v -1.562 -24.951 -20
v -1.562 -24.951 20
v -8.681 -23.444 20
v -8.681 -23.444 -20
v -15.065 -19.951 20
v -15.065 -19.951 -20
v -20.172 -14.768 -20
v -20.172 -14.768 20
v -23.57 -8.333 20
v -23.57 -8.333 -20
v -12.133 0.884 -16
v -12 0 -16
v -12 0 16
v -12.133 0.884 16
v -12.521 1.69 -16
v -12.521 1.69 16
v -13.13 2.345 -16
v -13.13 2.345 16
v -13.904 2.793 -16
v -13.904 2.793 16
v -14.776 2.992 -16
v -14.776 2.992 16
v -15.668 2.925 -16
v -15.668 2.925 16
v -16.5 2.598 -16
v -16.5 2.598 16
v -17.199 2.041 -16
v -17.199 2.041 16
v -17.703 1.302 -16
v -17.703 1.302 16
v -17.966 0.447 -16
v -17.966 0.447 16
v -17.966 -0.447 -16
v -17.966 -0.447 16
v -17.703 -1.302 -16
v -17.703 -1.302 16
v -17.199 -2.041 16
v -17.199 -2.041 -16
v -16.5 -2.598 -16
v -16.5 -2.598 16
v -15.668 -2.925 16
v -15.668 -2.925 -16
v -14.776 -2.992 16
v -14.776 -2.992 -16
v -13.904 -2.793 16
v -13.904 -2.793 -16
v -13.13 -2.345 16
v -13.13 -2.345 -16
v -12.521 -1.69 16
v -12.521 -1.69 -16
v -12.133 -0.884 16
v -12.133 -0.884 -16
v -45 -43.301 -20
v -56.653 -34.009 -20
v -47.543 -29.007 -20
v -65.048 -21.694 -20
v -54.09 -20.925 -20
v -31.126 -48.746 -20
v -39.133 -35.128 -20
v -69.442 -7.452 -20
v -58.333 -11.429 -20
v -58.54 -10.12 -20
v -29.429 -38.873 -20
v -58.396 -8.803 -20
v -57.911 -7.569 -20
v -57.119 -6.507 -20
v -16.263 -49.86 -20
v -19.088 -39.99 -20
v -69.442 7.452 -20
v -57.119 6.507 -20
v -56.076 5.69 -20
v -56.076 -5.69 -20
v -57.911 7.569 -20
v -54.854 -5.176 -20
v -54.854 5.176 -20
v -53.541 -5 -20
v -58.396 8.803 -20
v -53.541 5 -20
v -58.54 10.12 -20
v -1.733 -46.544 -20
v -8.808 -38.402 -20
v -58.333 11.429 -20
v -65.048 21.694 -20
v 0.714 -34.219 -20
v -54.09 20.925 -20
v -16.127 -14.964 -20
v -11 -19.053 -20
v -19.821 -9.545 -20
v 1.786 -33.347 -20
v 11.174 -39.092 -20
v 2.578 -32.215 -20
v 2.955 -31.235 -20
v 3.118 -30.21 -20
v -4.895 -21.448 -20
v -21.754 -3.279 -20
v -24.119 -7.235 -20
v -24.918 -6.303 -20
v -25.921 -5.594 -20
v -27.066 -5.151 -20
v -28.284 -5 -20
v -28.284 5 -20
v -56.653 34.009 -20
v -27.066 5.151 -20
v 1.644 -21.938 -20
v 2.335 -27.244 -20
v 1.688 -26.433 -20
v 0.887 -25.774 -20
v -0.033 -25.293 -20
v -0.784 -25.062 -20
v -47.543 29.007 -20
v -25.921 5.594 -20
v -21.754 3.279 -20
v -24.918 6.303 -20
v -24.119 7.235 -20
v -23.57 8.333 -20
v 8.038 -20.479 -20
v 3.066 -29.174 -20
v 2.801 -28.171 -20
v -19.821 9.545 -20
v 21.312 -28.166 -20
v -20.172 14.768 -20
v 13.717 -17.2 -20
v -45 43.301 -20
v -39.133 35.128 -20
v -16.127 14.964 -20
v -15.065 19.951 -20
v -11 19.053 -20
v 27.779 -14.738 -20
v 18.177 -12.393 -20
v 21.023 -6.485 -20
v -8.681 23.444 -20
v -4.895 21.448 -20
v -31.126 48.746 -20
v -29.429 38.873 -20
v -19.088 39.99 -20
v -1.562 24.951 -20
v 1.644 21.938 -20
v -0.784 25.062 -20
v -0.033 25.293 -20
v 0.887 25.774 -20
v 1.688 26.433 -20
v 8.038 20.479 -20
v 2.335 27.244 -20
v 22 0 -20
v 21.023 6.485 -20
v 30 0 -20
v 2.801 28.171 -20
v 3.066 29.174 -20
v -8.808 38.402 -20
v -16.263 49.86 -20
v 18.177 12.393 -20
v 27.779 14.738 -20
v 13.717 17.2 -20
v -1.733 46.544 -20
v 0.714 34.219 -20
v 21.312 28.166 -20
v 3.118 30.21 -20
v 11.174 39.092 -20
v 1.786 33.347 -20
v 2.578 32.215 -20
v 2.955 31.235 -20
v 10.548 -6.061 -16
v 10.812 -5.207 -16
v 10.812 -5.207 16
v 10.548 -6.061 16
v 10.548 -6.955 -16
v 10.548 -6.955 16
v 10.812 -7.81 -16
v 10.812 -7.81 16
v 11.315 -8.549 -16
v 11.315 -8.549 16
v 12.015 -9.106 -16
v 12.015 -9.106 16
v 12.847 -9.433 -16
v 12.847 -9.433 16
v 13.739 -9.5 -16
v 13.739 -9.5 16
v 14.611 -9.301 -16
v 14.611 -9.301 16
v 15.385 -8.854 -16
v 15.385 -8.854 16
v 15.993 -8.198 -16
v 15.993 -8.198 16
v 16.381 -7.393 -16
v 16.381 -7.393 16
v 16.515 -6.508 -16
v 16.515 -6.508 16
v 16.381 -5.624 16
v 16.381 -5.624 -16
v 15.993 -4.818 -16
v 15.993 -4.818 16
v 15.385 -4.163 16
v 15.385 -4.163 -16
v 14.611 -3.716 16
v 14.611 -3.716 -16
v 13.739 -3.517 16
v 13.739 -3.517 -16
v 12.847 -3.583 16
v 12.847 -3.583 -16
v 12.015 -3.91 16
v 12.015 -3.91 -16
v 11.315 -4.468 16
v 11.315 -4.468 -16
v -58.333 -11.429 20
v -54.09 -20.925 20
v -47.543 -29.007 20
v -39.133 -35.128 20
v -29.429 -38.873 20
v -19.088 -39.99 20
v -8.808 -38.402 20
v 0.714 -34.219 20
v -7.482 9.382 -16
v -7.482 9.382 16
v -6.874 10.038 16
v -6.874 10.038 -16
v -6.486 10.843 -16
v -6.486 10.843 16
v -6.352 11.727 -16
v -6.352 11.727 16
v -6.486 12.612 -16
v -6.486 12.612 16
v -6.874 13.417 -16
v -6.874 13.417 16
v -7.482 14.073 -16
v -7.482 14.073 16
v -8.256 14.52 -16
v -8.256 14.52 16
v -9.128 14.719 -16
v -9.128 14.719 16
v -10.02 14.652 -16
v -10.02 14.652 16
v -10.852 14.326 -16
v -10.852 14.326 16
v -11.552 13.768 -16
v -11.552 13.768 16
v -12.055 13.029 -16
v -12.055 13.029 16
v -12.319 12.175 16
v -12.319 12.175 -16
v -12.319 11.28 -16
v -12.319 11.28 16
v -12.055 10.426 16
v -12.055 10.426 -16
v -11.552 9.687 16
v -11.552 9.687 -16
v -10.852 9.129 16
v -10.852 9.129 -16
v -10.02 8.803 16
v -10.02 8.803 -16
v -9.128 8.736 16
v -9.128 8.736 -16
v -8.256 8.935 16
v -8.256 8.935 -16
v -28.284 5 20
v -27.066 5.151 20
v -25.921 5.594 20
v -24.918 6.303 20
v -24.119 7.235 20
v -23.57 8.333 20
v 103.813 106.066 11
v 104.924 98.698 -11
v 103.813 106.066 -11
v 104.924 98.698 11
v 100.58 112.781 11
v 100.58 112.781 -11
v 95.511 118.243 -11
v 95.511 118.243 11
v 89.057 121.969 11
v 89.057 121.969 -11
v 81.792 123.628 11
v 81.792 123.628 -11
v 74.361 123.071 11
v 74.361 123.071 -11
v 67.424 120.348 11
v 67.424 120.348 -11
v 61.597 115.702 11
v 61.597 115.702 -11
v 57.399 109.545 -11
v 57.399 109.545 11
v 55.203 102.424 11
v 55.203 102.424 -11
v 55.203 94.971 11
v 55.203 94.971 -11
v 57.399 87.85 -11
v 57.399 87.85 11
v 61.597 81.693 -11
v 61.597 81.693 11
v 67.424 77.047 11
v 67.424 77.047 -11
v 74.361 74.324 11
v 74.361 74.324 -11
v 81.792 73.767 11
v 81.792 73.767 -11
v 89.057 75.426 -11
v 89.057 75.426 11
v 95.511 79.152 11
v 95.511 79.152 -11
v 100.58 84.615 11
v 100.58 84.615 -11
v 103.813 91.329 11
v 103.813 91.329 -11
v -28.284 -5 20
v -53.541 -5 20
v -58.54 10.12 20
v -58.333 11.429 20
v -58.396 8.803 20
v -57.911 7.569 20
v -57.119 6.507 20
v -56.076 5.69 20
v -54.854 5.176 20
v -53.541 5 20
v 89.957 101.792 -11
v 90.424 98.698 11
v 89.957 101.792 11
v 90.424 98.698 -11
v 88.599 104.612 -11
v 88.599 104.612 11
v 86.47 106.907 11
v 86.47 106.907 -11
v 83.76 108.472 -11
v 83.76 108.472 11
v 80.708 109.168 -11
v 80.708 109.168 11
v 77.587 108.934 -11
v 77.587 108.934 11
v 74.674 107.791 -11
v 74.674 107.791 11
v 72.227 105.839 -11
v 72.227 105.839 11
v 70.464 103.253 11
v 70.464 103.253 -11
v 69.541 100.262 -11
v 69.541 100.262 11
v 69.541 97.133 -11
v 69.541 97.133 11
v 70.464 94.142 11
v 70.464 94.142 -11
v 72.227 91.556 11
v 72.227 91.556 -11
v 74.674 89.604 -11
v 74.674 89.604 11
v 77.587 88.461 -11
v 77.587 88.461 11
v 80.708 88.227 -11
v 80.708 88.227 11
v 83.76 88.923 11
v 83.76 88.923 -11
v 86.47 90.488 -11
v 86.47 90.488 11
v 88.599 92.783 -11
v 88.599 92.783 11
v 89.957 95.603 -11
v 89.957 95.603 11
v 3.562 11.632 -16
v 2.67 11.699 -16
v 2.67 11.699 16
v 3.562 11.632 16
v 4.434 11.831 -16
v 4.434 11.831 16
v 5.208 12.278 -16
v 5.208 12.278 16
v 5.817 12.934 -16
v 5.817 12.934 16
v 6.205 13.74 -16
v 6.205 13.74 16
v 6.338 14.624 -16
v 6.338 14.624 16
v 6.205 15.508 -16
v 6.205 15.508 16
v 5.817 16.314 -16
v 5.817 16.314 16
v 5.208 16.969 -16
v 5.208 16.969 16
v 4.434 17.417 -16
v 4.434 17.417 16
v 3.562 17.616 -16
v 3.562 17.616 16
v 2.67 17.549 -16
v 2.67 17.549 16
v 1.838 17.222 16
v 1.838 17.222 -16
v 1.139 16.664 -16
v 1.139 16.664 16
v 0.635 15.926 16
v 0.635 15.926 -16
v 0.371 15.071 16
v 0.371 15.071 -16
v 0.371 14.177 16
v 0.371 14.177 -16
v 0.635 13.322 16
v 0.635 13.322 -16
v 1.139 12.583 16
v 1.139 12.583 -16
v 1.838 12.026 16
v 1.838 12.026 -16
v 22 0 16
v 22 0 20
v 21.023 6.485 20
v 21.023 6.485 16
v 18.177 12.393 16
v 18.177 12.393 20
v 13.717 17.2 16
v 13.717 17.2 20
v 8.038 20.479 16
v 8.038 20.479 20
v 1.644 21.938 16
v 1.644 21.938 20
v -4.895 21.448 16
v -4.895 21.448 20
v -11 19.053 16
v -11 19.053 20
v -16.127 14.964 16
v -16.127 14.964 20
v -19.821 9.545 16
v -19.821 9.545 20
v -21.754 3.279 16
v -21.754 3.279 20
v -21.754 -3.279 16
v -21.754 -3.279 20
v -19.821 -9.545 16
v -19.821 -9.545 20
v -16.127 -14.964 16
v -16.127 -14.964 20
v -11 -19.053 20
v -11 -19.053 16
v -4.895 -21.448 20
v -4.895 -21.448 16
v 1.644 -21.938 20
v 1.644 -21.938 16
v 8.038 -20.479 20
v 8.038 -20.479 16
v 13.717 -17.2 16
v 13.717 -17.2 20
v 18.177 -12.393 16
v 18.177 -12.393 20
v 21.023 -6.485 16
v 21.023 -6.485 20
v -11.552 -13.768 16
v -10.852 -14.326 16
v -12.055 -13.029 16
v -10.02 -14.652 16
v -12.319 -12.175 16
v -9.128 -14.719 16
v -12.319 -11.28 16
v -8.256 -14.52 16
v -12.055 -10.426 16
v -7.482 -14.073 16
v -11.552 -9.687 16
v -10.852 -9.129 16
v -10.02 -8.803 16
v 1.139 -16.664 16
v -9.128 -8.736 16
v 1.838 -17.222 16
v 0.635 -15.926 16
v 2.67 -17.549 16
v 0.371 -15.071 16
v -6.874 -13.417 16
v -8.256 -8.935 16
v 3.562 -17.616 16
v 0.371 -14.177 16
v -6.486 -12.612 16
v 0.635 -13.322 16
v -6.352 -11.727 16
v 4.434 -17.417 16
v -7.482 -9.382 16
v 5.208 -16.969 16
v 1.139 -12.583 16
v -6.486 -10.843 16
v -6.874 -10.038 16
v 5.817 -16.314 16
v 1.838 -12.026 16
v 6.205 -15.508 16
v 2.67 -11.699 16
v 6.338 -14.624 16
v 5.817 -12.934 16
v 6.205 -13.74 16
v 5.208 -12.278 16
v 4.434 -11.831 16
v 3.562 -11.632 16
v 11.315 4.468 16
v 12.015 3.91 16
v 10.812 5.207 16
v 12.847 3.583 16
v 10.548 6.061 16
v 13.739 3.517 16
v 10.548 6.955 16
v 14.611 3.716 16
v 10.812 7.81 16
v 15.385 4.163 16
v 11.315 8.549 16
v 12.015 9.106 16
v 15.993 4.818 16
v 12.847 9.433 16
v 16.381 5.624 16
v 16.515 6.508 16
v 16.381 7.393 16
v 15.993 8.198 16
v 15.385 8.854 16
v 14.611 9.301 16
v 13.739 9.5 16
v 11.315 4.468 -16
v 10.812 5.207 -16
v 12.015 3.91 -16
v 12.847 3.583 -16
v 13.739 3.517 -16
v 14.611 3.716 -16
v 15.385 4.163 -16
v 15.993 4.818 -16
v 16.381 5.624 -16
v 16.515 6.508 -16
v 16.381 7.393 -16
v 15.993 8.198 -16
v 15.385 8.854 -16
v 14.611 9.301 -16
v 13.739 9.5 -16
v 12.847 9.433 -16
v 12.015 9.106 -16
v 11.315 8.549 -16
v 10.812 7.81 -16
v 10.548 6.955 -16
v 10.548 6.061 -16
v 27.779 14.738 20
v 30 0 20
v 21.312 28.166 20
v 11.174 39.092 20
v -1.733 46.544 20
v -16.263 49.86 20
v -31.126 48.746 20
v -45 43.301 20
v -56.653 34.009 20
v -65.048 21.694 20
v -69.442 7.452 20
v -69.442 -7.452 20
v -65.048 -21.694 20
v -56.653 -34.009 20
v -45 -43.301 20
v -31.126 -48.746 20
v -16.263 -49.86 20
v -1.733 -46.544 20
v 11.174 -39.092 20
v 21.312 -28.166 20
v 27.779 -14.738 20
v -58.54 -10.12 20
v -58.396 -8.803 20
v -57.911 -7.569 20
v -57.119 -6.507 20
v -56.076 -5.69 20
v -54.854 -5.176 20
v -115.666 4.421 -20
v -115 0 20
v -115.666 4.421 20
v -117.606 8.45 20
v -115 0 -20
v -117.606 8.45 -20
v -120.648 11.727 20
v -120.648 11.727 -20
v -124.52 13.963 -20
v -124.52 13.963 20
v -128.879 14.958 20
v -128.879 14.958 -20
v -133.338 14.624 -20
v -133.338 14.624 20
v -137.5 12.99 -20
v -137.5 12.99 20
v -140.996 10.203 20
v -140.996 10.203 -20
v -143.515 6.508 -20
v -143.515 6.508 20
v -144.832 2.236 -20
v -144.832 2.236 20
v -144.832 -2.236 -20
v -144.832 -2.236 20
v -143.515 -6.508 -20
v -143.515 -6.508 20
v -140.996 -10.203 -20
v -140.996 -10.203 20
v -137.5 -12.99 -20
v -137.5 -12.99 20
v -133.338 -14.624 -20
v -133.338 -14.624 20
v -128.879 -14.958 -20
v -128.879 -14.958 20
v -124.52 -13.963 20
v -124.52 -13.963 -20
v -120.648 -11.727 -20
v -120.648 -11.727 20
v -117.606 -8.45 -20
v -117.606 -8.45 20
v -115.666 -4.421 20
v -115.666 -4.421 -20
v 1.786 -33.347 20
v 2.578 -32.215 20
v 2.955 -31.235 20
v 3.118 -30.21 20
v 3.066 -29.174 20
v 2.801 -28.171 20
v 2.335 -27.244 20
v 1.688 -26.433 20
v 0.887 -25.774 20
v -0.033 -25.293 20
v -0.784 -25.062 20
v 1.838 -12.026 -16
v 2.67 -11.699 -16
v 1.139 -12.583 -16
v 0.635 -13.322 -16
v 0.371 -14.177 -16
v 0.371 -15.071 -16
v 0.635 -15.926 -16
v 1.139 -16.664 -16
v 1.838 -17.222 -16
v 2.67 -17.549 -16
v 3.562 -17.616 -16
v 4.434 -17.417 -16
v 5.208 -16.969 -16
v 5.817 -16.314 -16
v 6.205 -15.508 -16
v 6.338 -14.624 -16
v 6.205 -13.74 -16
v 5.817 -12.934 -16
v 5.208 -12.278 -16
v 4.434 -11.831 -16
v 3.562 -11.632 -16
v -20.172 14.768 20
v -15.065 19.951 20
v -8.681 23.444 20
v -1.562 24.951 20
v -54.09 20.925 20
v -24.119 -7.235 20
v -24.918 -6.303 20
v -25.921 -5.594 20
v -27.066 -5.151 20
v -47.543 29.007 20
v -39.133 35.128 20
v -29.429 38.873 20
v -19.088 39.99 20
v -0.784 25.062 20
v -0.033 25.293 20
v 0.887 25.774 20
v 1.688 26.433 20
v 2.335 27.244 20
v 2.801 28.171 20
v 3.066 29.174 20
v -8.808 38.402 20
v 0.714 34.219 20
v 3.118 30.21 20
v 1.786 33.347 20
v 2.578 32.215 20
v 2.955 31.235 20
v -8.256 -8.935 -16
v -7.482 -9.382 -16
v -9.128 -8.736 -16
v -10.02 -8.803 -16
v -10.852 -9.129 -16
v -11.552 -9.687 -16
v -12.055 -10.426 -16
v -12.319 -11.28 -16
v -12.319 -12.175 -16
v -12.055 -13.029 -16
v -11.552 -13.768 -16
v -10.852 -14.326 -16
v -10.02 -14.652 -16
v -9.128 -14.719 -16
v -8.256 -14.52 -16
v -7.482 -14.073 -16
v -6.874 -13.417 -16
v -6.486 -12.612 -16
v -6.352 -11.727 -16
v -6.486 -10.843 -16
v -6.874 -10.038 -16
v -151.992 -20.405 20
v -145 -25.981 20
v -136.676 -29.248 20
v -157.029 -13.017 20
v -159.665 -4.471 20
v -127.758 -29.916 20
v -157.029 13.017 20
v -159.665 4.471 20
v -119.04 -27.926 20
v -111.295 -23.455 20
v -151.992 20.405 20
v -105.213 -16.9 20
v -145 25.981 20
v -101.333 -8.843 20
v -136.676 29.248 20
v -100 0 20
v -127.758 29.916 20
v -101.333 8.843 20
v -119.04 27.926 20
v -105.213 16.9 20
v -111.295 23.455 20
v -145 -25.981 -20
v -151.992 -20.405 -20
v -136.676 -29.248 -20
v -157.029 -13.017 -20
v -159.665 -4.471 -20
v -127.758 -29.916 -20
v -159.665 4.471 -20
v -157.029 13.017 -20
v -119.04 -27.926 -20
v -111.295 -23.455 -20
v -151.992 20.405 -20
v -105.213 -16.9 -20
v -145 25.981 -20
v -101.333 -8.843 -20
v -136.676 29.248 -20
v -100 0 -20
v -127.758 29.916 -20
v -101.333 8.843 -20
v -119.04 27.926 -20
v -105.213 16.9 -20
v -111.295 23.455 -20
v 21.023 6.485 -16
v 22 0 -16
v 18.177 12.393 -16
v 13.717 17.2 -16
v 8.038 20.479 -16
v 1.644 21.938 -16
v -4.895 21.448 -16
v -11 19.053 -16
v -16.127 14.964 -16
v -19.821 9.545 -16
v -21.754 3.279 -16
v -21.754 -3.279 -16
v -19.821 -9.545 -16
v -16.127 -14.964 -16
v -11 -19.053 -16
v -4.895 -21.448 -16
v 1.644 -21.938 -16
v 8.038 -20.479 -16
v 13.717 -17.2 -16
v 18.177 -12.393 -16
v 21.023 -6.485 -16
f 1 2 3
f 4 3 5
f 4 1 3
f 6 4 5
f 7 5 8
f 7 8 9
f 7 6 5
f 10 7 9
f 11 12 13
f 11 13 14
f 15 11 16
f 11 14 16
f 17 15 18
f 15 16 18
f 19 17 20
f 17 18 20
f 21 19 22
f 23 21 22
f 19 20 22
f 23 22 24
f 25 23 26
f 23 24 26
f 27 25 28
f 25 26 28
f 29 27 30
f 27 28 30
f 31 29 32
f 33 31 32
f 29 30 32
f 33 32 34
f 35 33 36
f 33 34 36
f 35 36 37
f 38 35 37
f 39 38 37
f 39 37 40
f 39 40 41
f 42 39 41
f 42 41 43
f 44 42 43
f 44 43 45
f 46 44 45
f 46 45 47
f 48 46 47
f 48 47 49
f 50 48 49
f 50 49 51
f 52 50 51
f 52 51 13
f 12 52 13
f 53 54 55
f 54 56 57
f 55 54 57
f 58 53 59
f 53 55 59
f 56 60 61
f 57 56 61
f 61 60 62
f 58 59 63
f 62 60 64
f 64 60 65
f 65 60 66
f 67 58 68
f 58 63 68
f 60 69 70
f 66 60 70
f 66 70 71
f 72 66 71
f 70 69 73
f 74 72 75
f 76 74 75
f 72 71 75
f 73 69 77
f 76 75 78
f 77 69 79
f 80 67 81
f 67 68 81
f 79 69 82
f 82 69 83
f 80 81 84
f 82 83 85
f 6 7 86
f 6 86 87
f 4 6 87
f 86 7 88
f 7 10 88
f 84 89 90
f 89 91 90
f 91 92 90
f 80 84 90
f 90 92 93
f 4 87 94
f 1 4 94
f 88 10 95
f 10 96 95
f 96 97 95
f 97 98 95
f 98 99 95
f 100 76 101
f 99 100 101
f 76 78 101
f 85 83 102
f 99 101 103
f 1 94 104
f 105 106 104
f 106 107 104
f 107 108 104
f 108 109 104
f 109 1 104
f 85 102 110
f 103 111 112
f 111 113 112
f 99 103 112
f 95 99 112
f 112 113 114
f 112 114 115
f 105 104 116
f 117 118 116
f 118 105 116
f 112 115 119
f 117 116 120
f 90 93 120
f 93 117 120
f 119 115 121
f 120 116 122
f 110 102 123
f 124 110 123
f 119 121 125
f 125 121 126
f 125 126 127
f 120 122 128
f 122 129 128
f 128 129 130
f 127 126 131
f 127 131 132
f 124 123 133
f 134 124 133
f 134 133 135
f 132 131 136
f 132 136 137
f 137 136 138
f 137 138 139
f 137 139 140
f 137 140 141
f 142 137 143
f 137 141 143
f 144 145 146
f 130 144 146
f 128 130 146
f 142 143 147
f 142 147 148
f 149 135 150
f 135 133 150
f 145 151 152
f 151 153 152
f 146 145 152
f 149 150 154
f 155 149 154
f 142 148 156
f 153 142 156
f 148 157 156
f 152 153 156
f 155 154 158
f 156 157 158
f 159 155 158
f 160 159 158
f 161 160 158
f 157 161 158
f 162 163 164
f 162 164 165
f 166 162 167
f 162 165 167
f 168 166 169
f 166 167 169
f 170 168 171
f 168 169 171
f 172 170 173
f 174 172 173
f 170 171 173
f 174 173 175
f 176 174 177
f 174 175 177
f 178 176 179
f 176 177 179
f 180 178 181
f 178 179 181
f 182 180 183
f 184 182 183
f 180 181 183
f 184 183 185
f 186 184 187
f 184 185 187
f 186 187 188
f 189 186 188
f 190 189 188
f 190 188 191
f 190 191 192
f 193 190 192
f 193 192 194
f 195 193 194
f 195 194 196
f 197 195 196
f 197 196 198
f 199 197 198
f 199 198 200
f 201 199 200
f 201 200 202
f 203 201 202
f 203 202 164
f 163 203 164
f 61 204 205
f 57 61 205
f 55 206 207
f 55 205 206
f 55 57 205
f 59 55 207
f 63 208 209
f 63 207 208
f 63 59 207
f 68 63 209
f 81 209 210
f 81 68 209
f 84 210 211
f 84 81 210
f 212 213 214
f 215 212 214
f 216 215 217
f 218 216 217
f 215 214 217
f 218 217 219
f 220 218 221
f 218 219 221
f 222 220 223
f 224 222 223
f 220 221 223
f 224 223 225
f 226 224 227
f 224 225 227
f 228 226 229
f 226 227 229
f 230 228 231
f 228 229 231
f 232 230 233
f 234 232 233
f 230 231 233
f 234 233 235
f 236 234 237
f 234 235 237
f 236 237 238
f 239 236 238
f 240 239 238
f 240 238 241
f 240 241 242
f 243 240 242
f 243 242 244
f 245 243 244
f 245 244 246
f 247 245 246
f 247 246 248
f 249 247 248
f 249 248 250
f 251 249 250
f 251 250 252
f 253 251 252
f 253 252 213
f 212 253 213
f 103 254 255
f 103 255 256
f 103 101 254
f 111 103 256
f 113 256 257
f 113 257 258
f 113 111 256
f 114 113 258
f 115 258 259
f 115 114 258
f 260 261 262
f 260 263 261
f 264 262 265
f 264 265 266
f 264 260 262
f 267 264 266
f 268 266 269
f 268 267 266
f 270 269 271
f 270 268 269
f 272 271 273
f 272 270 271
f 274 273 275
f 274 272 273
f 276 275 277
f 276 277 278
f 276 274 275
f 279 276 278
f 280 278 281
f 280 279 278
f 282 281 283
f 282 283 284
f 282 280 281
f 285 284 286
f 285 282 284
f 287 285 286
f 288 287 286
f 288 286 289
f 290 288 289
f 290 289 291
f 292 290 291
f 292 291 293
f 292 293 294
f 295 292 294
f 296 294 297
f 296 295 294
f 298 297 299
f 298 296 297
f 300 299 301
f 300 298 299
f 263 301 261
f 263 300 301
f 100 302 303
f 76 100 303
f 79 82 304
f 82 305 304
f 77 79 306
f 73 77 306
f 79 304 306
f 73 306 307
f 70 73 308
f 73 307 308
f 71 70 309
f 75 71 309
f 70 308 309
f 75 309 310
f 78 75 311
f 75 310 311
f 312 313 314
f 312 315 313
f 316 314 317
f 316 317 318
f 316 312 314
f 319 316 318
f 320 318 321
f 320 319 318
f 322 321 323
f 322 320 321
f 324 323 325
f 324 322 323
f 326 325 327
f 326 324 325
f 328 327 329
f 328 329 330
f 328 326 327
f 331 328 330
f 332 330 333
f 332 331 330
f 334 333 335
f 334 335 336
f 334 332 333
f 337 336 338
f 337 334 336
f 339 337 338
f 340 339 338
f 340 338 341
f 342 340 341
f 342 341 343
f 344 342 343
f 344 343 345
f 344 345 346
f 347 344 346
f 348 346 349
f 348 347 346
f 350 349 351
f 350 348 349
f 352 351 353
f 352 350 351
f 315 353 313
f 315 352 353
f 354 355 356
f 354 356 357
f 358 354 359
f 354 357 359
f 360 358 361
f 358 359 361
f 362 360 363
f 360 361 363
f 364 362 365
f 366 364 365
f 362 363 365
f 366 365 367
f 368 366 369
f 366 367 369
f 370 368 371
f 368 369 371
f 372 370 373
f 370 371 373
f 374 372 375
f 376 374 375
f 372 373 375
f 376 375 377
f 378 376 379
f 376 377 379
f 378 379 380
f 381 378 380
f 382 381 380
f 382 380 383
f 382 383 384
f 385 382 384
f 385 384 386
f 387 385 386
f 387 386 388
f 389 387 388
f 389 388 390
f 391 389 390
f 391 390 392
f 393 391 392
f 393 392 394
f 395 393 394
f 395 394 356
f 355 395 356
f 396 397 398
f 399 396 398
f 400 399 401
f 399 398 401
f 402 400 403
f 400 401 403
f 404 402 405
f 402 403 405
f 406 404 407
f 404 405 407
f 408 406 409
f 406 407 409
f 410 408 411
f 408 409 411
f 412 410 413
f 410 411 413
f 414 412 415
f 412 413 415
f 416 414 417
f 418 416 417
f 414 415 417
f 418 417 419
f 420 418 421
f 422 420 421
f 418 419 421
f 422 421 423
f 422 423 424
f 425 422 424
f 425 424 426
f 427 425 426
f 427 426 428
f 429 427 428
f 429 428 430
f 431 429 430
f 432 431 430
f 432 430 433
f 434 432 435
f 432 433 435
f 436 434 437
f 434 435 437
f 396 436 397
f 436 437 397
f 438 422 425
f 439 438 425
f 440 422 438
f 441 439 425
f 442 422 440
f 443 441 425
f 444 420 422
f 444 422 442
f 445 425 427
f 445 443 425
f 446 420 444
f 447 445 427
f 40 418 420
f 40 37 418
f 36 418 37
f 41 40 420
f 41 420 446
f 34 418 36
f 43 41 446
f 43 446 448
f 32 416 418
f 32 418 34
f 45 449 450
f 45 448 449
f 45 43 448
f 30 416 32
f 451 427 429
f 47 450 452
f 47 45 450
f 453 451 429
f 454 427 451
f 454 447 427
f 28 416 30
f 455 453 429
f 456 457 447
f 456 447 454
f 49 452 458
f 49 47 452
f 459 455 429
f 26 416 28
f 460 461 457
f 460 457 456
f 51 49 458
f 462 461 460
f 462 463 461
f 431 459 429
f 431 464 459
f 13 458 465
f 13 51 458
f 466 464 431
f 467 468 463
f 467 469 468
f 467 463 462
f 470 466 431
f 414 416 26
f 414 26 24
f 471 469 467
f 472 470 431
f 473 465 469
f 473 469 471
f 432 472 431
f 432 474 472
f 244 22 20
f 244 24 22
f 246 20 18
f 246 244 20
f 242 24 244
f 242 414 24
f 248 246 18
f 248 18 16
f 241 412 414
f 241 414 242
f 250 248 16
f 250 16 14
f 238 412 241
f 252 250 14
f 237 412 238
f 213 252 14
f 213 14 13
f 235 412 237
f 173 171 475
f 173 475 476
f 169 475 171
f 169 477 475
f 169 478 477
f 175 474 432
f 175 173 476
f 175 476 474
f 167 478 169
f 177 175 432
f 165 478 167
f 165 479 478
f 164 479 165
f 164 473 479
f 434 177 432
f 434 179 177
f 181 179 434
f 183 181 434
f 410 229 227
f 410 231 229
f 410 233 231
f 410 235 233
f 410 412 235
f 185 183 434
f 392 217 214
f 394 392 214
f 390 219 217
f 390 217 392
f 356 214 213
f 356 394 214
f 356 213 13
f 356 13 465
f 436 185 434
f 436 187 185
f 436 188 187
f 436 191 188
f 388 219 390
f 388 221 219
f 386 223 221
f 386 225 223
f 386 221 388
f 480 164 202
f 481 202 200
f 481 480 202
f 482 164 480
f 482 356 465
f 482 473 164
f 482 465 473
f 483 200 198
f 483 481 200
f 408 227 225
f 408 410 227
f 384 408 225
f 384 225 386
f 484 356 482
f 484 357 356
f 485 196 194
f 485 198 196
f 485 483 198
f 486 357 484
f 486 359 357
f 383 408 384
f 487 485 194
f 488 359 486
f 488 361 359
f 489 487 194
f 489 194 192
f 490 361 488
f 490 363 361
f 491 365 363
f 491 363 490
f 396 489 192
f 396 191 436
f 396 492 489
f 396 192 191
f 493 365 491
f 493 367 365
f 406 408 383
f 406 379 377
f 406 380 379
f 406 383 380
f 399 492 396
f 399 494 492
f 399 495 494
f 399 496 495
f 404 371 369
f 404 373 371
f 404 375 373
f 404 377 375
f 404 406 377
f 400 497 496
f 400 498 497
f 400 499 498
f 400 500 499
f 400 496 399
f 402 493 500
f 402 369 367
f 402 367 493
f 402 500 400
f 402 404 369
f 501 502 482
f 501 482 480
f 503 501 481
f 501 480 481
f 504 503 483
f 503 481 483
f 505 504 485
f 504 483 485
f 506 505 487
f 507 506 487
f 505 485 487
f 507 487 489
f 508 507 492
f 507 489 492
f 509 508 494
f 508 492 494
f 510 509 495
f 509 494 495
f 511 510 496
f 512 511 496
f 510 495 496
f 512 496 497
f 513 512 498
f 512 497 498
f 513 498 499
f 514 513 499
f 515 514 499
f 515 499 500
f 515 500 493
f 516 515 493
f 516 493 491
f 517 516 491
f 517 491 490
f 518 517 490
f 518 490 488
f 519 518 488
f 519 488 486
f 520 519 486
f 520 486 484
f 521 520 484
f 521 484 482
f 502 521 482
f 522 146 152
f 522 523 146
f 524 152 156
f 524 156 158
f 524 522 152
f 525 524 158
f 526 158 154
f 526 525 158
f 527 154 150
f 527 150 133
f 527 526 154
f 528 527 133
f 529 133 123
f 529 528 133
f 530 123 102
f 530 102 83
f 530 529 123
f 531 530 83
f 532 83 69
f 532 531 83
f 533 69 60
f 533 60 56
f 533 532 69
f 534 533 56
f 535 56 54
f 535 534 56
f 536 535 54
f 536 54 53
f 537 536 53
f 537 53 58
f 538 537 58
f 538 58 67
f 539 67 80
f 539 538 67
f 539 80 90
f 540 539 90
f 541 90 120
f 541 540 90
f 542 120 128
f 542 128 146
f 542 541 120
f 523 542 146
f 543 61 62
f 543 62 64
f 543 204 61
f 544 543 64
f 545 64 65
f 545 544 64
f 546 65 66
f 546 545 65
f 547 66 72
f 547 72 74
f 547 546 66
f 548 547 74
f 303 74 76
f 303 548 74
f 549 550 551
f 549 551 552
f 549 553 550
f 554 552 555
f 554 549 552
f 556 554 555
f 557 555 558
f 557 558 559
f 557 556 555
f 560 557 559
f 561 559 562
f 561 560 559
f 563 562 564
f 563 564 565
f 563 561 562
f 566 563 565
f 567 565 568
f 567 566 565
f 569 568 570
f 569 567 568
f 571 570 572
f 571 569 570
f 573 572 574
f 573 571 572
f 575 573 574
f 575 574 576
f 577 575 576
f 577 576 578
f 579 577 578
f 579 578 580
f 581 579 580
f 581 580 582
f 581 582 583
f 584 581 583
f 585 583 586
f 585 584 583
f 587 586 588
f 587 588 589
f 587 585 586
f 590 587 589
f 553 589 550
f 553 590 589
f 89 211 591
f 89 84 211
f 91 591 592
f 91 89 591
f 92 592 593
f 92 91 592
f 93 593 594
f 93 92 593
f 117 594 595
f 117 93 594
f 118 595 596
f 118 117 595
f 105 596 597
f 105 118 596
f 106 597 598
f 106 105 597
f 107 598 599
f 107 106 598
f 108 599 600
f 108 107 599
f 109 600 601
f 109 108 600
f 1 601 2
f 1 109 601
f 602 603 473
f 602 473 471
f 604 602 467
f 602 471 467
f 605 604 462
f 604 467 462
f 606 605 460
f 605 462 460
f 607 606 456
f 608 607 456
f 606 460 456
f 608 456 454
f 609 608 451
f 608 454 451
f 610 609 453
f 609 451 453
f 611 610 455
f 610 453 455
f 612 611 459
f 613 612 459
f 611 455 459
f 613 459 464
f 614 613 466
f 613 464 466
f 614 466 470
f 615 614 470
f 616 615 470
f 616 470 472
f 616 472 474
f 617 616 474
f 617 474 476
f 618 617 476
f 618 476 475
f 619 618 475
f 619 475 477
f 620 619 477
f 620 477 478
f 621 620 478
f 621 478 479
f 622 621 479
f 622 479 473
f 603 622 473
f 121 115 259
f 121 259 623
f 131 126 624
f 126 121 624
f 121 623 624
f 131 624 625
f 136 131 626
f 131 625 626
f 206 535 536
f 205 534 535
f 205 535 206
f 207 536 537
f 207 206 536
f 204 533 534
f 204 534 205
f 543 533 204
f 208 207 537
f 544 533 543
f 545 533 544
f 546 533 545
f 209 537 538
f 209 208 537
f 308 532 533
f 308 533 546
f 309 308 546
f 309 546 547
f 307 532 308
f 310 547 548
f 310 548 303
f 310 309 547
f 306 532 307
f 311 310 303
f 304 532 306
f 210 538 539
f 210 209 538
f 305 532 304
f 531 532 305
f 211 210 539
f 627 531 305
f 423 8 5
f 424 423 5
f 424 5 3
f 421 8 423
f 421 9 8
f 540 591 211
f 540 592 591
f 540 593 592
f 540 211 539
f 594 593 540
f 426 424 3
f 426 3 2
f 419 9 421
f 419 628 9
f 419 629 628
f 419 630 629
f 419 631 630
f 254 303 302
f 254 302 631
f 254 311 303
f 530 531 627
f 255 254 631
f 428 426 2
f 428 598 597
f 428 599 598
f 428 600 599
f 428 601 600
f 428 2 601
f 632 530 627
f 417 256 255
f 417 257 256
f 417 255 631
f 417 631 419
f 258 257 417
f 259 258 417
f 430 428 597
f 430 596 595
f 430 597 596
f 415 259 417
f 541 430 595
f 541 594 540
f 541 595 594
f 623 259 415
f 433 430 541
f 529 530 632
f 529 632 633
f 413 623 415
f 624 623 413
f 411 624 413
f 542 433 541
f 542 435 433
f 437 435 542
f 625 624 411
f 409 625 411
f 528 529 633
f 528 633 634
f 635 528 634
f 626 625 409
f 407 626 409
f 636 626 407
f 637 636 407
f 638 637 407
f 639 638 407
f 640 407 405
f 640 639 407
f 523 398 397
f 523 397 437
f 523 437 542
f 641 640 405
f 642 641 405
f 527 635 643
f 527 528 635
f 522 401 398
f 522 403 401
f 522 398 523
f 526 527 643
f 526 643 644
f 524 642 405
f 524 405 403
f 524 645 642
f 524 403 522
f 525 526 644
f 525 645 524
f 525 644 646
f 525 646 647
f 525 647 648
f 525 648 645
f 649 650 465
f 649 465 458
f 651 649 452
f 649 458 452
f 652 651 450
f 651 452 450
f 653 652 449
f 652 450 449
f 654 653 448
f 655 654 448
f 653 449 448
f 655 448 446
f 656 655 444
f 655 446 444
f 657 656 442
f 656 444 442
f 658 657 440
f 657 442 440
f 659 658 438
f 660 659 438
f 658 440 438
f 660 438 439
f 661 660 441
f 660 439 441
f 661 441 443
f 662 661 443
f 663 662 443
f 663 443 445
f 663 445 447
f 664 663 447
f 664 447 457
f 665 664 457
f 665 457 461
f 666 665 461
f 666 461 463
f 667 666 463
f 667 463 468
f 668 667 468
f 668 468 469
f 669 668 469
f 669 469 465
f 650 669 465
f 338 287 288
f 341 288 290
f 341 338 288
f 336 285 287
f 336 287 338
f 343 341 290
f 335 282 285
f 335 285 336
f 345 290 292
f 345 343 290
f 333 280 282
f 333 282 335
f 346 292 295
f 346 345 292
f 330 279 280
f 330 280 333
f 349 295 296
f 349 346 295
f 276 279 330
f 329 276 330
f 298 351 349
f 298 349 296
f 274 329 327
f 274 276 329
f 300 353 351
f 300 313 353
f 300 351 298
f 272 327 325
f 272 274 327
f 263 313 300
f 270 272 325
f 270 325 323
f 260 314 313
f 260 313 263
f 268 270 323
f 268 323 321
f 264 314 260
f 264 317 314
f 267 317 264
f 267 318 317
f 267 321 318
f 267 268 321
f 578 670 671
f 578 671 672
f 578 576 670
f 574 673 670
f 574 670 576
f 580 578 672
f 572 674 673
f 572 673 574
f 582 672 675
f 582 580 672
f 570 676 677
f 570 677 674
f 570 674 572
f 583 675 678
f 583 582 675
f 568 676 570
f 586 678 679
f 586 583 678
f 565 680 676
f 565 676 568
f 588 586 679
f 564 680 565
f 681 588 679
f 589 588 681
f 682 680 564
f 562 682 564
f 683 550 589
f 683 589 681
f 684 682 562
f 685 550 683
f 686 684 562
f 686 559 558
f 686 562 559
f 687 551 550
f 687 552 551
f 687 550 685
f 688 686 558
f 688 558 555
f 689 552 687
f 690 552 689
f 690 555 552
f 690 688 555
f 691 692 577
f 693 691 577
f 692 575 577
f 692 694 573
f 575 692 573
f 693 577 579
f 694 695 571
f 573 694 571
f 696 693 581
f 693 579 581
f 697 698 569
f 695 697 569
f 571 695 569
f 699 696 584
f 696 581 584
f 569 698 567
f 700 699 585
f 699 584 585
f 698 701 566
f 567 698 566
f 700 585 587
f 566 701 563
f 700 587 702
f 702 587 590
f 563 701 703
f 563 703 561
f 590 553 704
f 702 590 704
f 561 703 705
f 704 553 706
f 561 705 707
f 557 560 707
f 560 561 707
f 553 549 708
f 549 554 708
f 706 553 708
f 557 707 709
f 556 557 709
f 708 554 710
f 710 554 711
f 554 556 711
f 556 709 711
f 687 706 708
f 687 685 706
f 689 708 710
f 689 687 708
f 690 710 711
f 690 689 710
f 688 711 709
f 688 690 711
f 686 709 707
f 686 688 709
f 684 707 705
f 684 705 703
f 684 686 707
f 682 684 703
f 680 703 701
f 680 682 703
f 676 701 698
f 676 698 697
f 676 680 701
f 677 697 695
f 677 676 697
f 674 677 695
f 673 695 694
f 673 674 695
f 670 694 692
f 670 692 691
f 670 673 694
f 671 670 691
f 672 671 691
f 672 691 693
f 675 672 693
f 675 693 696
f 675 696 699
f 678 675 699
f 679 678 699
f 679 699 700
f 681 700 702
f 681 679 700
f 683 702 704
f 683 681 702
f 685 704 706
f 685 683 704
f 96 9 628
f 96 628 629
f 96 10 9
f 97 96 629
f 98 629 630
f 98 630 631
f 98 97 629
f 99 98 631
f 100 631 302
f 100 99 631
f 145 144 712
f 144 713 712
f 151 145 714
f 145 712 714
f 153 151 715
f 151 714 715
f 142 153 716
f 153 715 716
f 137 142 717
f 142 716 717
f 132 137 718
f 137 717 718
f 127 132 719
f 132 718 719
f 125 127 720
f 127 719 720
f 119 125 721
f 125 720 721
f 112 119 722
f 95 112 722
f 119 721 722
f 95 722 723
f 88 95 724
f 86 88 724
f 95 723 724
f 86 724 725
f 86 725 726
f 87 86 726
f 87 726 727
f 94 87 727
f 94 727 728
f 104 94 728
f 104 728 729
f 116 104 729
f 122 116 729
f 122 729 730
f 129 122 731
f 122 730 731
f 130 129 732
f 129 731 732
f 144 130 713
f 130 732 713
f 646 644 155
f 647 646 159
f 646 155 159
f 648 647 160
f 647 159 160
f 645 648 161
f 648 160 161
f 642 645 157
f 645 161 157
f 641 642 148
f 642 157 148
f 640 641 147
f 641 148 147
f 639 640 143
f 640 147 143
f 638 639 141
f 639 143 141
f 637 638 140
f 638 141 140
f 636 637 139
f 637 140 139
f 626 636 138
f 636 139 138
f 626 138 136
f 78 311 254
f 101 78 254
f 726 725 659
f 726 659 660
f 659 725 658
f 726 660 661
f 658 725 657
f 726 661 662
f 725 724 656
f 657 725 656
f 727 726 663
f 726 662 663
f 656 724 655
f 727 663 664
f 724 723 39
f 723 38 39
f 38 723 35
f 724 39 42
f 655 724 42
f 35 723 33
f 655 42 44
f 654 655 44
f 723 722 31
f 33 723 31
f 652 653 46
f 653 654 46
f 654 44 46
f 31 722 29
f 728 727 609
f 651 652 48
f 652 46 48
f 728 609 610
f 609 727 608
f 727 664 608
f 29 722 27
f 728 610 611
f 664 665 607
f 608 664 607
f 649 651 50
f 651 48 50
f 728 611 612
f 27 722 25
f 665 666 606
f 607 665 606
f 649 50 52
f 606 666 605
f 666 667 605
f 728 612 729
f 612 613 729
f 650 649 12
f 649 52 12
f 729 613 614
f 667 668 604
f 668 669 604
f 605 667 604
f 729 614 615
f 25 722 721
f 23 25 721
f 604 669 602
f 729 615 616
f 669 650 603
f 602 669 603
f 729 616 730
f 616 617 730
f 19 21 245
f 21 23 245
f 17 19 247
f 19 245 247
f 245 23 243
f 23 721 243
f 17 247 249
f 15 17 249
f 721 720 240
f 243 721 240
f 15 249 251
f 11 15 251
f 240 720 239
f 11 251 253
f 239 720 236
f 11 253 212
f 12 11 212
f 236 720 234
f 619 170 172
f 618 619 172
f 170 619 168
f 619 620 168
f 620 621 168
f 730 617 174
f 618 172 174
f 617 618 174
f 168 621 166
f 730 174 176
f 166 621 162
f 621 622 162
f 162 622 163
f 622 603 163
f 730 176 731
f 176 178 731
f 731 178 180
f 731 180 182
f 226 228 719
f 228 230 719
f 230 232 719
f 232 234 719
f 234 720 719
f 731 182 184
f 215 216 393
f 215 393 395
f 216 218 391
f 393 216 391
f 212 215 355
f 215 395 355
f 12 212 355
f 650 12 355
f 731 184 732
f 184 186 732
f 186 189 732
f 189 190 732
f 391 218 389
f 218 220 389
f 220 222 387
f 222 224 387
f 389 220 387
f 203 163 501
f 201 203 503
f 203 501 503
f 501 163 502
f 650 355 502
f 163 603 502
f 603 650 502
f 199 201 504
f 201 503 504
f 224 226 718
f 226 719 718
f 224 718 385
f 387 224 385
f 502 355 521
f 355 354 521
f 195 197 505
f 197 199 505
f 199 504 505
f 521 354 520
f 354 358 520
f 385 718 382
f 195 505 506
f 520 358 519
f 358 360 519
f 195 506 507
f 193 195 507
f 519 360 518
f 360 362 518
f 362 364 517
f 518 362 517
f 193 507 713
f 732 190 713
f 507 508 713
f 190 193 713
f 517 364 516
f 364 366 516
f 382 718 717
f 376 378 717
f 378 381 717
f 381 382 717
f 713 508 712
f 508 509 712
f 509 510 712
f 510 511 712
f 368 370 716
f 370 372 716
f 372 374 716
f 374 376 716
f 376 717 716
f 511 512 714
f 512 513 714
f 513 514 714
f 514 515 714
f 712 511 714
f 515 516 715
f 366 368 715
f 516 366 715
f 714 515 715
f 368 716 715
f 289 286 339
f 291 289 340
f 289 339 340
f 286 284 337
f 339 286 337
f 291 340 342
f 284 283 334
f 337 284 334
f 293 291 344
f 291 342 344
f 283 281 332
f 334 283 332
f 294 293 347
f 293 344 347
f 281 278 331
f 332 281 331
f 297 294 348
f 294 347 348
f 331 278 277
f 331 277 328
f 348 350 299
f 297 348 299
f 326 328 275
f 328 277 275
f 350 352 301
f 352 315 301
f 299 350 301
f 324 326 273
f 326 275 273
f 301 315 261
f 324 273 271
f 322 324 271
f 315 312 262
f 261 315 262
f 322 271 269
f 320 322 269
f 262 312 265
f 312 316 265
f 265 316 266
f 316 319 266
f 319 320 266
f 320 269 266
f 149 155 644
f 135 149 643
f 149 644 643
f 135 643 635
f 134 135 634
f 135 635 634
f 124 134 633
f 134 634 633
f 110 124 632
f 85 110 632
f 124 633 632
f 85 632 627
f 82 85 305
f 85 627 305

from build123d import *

# Parameters (mm, degrees)
F0_R          = 50
F2_DEPTH      = 20
F3_DEPTH      = 44.5
F5_R          = 5
F6_R          = 22
F7_DEPTH      = 4
F7_DEPTH_BACK = -10
F10_R         = 3
F11_DEPTH     = 60
F12_COUNT     = 7
F14_R         = 30
F14_R_2       = 15
F15_DEPTH     = 20
F14_R_3       = 25
F14_R_4       = 10.5
F16_DEPTH     = 11


with BuildPart() as f2:
    # F0 (on Top) → F2 (new body, symmetric)
    with BuildSketch(Plane.XY):
        with Locations((-20, 0)):
            Circle(F0_R)
    extrude(amount=F2_DEPTH, both=True)


with BuildPart() as f3:
    # F1 (on Top) → F3 (new body, symmetric)
    with BuildSketch(Plane.XY):
        with BuildLine():
            Line((-24.494897, -5), (-59.68627, -5))
            ThreePointArc((-59.68627, -5), (-28.170536, -39.156639), (14.375, -20.453835))
            ThreePointArc((14.375, -20.453835), (-9.236251, -23.231265), (-24.494897, -5))
        make_face()
        with BuildLine():
            ThreePointArc((14.375, 20.453835), (-28.170536, 39.156639), (-59.68627, 5))
            Line((-59.68627, 5), (-24.494897, 5))
            ThreePointArc((-24.494897, 5), (-9.236251, 23.231265), (14.375, 20.453835))
        make_face()
    extrude(amount=F3_DEPTH, both=True)


with BuildPart() as f2_1:
    add(f2.part)

    # F4: cut F3
    add(f3.part, mode=Mode.SUBTRACT)

    # F5
    f5_edges = [f2_1.edges().sort_by_distance(p)[0] for p in [
        (14.375, 20.453835, 0),
        (-59.68627, 5, 0),
        (-24.494897, 5, 0),
        (-24.494897, -5, 0),
        (-59.68627, -5, 0),
        (14.375, -20.453835, 0),
    ]]
    fillet(f5_edges, radius=F5_R)


with BuildPart() as f7:
    # F6 (on face) → F7 (new body, two sides)
    with BuildSketch(Plane.XY.offset(20)) as f7_sk:
        Circle(F6_R)
    extrude(amount=-F7_DEPTH)
    extrude(f7_sk.sketch, amount=-F7_DEPTH_BACK)


with BuildPart() as f8_1:
    # F8: instance of F7
    add(f7.part.mirror(Plane.XY))


with BuildPart() as f2_2:
    add(f2_1.part)

    # F9: cut F7, F8_1
    add(f7.part, mode=Mode.SUBTRACT)
    add(f8_1.part, mode=Mode.SUBTRACT)


with BuildPart() as f11:
    # F10 (on face) → F11 (new body)
    with BuildSketch(Plane.XY.offset(20)):
        with Locations((-15, 0)):
            Circle(F10_R)
    extrude(amount=-F11_DEPTH)


with BuildPart() as f12_1:
    # F12: instance of F11
    add(f11.part.rotate(Axis((0, 0, 20), (0, 0, 1)), 1 * 360 / F12_COUNT))


with BuildPart() as f12_2:
    # F12: instance of F11
    add(f11.part.rotate(Axis((0, 0, 20), (0, 0, 1)), 2 * 360 / F12_COUNT))


with BuildPart() as f12_3:
    # F12: instance of F11
    add(f11.part.rotate(Axis((0, 0, 20), (0, 0, 1)), 3 * 360 / F12_COUNT))


with BuildPart() as f12_4:
    # F12: instance of F11
    add(f11.part.rotate(Axis((0, 0, 20), (0, 0, 1)), 4 * 360 / F12_COUNT))


with BuildPart() as f12_5:
    # F12: instance of F11
    add(f11.part.rotate(Axis((0, 0, 20), (0, 0, 1)), 5 * 360 / F12_COUNT))


with BuildPart() as f12_6:
    # F12: instance of F11
    add(f11.part.rotate(Axis((0, 0, 20), (0, 0, 1)), 6 * 360 / F12_COUNT))


with BuildPart() as f2_3:
    add(f2_2.part)

    # F13: cut F12_5, F12_3, F12_4, F11, F12_6, F12_1, F12_2
    add(f12_5.part, mode=Mode.SUBTRACT)
    add(f12_3.part, mode=Mode.SUBTRACT)
    add(f12_4.part, mode=Mode.SUBTRACT)
    add(f11.part, mode=Mode.SUBTRACT)
    add(f12_6.part, mode=Mode.SUBTRACT)
    add(f12_1.part, mode=Mode.SUBTRACT)
    add(f12_2.part, mode=Mode.SUBTRACT)


with BuildPart() as f15:
    # F14 (on Top) → F15 (new body, symmetric)
    with BuildSketch(Plane.XY):
        with Locations((-130, 0)):
            Circle(F14_R)
        with Locations((-130, 0)):
            Circle(F14_R_2, mode=Mode.SUBTRACT)
    extrude(amount=F15_DEPTH, both=True)


with BuildPart() as f16:
    # F14 (on Top) → F16 (new body, symmetric)
    with BuildSketch(Plane.XY):
        with Locations((79.92369, 98.697537)):
            Circle(F14_R_3)
        with Locations((79.92369, 98.697537)):
            Circle(F14_R_4, mode=Mode.SUBTRACT)
    extrude(amount=F16_DEPTH, both=True)


solid = Compound([f2_3.part, f15.part, f16.part])
